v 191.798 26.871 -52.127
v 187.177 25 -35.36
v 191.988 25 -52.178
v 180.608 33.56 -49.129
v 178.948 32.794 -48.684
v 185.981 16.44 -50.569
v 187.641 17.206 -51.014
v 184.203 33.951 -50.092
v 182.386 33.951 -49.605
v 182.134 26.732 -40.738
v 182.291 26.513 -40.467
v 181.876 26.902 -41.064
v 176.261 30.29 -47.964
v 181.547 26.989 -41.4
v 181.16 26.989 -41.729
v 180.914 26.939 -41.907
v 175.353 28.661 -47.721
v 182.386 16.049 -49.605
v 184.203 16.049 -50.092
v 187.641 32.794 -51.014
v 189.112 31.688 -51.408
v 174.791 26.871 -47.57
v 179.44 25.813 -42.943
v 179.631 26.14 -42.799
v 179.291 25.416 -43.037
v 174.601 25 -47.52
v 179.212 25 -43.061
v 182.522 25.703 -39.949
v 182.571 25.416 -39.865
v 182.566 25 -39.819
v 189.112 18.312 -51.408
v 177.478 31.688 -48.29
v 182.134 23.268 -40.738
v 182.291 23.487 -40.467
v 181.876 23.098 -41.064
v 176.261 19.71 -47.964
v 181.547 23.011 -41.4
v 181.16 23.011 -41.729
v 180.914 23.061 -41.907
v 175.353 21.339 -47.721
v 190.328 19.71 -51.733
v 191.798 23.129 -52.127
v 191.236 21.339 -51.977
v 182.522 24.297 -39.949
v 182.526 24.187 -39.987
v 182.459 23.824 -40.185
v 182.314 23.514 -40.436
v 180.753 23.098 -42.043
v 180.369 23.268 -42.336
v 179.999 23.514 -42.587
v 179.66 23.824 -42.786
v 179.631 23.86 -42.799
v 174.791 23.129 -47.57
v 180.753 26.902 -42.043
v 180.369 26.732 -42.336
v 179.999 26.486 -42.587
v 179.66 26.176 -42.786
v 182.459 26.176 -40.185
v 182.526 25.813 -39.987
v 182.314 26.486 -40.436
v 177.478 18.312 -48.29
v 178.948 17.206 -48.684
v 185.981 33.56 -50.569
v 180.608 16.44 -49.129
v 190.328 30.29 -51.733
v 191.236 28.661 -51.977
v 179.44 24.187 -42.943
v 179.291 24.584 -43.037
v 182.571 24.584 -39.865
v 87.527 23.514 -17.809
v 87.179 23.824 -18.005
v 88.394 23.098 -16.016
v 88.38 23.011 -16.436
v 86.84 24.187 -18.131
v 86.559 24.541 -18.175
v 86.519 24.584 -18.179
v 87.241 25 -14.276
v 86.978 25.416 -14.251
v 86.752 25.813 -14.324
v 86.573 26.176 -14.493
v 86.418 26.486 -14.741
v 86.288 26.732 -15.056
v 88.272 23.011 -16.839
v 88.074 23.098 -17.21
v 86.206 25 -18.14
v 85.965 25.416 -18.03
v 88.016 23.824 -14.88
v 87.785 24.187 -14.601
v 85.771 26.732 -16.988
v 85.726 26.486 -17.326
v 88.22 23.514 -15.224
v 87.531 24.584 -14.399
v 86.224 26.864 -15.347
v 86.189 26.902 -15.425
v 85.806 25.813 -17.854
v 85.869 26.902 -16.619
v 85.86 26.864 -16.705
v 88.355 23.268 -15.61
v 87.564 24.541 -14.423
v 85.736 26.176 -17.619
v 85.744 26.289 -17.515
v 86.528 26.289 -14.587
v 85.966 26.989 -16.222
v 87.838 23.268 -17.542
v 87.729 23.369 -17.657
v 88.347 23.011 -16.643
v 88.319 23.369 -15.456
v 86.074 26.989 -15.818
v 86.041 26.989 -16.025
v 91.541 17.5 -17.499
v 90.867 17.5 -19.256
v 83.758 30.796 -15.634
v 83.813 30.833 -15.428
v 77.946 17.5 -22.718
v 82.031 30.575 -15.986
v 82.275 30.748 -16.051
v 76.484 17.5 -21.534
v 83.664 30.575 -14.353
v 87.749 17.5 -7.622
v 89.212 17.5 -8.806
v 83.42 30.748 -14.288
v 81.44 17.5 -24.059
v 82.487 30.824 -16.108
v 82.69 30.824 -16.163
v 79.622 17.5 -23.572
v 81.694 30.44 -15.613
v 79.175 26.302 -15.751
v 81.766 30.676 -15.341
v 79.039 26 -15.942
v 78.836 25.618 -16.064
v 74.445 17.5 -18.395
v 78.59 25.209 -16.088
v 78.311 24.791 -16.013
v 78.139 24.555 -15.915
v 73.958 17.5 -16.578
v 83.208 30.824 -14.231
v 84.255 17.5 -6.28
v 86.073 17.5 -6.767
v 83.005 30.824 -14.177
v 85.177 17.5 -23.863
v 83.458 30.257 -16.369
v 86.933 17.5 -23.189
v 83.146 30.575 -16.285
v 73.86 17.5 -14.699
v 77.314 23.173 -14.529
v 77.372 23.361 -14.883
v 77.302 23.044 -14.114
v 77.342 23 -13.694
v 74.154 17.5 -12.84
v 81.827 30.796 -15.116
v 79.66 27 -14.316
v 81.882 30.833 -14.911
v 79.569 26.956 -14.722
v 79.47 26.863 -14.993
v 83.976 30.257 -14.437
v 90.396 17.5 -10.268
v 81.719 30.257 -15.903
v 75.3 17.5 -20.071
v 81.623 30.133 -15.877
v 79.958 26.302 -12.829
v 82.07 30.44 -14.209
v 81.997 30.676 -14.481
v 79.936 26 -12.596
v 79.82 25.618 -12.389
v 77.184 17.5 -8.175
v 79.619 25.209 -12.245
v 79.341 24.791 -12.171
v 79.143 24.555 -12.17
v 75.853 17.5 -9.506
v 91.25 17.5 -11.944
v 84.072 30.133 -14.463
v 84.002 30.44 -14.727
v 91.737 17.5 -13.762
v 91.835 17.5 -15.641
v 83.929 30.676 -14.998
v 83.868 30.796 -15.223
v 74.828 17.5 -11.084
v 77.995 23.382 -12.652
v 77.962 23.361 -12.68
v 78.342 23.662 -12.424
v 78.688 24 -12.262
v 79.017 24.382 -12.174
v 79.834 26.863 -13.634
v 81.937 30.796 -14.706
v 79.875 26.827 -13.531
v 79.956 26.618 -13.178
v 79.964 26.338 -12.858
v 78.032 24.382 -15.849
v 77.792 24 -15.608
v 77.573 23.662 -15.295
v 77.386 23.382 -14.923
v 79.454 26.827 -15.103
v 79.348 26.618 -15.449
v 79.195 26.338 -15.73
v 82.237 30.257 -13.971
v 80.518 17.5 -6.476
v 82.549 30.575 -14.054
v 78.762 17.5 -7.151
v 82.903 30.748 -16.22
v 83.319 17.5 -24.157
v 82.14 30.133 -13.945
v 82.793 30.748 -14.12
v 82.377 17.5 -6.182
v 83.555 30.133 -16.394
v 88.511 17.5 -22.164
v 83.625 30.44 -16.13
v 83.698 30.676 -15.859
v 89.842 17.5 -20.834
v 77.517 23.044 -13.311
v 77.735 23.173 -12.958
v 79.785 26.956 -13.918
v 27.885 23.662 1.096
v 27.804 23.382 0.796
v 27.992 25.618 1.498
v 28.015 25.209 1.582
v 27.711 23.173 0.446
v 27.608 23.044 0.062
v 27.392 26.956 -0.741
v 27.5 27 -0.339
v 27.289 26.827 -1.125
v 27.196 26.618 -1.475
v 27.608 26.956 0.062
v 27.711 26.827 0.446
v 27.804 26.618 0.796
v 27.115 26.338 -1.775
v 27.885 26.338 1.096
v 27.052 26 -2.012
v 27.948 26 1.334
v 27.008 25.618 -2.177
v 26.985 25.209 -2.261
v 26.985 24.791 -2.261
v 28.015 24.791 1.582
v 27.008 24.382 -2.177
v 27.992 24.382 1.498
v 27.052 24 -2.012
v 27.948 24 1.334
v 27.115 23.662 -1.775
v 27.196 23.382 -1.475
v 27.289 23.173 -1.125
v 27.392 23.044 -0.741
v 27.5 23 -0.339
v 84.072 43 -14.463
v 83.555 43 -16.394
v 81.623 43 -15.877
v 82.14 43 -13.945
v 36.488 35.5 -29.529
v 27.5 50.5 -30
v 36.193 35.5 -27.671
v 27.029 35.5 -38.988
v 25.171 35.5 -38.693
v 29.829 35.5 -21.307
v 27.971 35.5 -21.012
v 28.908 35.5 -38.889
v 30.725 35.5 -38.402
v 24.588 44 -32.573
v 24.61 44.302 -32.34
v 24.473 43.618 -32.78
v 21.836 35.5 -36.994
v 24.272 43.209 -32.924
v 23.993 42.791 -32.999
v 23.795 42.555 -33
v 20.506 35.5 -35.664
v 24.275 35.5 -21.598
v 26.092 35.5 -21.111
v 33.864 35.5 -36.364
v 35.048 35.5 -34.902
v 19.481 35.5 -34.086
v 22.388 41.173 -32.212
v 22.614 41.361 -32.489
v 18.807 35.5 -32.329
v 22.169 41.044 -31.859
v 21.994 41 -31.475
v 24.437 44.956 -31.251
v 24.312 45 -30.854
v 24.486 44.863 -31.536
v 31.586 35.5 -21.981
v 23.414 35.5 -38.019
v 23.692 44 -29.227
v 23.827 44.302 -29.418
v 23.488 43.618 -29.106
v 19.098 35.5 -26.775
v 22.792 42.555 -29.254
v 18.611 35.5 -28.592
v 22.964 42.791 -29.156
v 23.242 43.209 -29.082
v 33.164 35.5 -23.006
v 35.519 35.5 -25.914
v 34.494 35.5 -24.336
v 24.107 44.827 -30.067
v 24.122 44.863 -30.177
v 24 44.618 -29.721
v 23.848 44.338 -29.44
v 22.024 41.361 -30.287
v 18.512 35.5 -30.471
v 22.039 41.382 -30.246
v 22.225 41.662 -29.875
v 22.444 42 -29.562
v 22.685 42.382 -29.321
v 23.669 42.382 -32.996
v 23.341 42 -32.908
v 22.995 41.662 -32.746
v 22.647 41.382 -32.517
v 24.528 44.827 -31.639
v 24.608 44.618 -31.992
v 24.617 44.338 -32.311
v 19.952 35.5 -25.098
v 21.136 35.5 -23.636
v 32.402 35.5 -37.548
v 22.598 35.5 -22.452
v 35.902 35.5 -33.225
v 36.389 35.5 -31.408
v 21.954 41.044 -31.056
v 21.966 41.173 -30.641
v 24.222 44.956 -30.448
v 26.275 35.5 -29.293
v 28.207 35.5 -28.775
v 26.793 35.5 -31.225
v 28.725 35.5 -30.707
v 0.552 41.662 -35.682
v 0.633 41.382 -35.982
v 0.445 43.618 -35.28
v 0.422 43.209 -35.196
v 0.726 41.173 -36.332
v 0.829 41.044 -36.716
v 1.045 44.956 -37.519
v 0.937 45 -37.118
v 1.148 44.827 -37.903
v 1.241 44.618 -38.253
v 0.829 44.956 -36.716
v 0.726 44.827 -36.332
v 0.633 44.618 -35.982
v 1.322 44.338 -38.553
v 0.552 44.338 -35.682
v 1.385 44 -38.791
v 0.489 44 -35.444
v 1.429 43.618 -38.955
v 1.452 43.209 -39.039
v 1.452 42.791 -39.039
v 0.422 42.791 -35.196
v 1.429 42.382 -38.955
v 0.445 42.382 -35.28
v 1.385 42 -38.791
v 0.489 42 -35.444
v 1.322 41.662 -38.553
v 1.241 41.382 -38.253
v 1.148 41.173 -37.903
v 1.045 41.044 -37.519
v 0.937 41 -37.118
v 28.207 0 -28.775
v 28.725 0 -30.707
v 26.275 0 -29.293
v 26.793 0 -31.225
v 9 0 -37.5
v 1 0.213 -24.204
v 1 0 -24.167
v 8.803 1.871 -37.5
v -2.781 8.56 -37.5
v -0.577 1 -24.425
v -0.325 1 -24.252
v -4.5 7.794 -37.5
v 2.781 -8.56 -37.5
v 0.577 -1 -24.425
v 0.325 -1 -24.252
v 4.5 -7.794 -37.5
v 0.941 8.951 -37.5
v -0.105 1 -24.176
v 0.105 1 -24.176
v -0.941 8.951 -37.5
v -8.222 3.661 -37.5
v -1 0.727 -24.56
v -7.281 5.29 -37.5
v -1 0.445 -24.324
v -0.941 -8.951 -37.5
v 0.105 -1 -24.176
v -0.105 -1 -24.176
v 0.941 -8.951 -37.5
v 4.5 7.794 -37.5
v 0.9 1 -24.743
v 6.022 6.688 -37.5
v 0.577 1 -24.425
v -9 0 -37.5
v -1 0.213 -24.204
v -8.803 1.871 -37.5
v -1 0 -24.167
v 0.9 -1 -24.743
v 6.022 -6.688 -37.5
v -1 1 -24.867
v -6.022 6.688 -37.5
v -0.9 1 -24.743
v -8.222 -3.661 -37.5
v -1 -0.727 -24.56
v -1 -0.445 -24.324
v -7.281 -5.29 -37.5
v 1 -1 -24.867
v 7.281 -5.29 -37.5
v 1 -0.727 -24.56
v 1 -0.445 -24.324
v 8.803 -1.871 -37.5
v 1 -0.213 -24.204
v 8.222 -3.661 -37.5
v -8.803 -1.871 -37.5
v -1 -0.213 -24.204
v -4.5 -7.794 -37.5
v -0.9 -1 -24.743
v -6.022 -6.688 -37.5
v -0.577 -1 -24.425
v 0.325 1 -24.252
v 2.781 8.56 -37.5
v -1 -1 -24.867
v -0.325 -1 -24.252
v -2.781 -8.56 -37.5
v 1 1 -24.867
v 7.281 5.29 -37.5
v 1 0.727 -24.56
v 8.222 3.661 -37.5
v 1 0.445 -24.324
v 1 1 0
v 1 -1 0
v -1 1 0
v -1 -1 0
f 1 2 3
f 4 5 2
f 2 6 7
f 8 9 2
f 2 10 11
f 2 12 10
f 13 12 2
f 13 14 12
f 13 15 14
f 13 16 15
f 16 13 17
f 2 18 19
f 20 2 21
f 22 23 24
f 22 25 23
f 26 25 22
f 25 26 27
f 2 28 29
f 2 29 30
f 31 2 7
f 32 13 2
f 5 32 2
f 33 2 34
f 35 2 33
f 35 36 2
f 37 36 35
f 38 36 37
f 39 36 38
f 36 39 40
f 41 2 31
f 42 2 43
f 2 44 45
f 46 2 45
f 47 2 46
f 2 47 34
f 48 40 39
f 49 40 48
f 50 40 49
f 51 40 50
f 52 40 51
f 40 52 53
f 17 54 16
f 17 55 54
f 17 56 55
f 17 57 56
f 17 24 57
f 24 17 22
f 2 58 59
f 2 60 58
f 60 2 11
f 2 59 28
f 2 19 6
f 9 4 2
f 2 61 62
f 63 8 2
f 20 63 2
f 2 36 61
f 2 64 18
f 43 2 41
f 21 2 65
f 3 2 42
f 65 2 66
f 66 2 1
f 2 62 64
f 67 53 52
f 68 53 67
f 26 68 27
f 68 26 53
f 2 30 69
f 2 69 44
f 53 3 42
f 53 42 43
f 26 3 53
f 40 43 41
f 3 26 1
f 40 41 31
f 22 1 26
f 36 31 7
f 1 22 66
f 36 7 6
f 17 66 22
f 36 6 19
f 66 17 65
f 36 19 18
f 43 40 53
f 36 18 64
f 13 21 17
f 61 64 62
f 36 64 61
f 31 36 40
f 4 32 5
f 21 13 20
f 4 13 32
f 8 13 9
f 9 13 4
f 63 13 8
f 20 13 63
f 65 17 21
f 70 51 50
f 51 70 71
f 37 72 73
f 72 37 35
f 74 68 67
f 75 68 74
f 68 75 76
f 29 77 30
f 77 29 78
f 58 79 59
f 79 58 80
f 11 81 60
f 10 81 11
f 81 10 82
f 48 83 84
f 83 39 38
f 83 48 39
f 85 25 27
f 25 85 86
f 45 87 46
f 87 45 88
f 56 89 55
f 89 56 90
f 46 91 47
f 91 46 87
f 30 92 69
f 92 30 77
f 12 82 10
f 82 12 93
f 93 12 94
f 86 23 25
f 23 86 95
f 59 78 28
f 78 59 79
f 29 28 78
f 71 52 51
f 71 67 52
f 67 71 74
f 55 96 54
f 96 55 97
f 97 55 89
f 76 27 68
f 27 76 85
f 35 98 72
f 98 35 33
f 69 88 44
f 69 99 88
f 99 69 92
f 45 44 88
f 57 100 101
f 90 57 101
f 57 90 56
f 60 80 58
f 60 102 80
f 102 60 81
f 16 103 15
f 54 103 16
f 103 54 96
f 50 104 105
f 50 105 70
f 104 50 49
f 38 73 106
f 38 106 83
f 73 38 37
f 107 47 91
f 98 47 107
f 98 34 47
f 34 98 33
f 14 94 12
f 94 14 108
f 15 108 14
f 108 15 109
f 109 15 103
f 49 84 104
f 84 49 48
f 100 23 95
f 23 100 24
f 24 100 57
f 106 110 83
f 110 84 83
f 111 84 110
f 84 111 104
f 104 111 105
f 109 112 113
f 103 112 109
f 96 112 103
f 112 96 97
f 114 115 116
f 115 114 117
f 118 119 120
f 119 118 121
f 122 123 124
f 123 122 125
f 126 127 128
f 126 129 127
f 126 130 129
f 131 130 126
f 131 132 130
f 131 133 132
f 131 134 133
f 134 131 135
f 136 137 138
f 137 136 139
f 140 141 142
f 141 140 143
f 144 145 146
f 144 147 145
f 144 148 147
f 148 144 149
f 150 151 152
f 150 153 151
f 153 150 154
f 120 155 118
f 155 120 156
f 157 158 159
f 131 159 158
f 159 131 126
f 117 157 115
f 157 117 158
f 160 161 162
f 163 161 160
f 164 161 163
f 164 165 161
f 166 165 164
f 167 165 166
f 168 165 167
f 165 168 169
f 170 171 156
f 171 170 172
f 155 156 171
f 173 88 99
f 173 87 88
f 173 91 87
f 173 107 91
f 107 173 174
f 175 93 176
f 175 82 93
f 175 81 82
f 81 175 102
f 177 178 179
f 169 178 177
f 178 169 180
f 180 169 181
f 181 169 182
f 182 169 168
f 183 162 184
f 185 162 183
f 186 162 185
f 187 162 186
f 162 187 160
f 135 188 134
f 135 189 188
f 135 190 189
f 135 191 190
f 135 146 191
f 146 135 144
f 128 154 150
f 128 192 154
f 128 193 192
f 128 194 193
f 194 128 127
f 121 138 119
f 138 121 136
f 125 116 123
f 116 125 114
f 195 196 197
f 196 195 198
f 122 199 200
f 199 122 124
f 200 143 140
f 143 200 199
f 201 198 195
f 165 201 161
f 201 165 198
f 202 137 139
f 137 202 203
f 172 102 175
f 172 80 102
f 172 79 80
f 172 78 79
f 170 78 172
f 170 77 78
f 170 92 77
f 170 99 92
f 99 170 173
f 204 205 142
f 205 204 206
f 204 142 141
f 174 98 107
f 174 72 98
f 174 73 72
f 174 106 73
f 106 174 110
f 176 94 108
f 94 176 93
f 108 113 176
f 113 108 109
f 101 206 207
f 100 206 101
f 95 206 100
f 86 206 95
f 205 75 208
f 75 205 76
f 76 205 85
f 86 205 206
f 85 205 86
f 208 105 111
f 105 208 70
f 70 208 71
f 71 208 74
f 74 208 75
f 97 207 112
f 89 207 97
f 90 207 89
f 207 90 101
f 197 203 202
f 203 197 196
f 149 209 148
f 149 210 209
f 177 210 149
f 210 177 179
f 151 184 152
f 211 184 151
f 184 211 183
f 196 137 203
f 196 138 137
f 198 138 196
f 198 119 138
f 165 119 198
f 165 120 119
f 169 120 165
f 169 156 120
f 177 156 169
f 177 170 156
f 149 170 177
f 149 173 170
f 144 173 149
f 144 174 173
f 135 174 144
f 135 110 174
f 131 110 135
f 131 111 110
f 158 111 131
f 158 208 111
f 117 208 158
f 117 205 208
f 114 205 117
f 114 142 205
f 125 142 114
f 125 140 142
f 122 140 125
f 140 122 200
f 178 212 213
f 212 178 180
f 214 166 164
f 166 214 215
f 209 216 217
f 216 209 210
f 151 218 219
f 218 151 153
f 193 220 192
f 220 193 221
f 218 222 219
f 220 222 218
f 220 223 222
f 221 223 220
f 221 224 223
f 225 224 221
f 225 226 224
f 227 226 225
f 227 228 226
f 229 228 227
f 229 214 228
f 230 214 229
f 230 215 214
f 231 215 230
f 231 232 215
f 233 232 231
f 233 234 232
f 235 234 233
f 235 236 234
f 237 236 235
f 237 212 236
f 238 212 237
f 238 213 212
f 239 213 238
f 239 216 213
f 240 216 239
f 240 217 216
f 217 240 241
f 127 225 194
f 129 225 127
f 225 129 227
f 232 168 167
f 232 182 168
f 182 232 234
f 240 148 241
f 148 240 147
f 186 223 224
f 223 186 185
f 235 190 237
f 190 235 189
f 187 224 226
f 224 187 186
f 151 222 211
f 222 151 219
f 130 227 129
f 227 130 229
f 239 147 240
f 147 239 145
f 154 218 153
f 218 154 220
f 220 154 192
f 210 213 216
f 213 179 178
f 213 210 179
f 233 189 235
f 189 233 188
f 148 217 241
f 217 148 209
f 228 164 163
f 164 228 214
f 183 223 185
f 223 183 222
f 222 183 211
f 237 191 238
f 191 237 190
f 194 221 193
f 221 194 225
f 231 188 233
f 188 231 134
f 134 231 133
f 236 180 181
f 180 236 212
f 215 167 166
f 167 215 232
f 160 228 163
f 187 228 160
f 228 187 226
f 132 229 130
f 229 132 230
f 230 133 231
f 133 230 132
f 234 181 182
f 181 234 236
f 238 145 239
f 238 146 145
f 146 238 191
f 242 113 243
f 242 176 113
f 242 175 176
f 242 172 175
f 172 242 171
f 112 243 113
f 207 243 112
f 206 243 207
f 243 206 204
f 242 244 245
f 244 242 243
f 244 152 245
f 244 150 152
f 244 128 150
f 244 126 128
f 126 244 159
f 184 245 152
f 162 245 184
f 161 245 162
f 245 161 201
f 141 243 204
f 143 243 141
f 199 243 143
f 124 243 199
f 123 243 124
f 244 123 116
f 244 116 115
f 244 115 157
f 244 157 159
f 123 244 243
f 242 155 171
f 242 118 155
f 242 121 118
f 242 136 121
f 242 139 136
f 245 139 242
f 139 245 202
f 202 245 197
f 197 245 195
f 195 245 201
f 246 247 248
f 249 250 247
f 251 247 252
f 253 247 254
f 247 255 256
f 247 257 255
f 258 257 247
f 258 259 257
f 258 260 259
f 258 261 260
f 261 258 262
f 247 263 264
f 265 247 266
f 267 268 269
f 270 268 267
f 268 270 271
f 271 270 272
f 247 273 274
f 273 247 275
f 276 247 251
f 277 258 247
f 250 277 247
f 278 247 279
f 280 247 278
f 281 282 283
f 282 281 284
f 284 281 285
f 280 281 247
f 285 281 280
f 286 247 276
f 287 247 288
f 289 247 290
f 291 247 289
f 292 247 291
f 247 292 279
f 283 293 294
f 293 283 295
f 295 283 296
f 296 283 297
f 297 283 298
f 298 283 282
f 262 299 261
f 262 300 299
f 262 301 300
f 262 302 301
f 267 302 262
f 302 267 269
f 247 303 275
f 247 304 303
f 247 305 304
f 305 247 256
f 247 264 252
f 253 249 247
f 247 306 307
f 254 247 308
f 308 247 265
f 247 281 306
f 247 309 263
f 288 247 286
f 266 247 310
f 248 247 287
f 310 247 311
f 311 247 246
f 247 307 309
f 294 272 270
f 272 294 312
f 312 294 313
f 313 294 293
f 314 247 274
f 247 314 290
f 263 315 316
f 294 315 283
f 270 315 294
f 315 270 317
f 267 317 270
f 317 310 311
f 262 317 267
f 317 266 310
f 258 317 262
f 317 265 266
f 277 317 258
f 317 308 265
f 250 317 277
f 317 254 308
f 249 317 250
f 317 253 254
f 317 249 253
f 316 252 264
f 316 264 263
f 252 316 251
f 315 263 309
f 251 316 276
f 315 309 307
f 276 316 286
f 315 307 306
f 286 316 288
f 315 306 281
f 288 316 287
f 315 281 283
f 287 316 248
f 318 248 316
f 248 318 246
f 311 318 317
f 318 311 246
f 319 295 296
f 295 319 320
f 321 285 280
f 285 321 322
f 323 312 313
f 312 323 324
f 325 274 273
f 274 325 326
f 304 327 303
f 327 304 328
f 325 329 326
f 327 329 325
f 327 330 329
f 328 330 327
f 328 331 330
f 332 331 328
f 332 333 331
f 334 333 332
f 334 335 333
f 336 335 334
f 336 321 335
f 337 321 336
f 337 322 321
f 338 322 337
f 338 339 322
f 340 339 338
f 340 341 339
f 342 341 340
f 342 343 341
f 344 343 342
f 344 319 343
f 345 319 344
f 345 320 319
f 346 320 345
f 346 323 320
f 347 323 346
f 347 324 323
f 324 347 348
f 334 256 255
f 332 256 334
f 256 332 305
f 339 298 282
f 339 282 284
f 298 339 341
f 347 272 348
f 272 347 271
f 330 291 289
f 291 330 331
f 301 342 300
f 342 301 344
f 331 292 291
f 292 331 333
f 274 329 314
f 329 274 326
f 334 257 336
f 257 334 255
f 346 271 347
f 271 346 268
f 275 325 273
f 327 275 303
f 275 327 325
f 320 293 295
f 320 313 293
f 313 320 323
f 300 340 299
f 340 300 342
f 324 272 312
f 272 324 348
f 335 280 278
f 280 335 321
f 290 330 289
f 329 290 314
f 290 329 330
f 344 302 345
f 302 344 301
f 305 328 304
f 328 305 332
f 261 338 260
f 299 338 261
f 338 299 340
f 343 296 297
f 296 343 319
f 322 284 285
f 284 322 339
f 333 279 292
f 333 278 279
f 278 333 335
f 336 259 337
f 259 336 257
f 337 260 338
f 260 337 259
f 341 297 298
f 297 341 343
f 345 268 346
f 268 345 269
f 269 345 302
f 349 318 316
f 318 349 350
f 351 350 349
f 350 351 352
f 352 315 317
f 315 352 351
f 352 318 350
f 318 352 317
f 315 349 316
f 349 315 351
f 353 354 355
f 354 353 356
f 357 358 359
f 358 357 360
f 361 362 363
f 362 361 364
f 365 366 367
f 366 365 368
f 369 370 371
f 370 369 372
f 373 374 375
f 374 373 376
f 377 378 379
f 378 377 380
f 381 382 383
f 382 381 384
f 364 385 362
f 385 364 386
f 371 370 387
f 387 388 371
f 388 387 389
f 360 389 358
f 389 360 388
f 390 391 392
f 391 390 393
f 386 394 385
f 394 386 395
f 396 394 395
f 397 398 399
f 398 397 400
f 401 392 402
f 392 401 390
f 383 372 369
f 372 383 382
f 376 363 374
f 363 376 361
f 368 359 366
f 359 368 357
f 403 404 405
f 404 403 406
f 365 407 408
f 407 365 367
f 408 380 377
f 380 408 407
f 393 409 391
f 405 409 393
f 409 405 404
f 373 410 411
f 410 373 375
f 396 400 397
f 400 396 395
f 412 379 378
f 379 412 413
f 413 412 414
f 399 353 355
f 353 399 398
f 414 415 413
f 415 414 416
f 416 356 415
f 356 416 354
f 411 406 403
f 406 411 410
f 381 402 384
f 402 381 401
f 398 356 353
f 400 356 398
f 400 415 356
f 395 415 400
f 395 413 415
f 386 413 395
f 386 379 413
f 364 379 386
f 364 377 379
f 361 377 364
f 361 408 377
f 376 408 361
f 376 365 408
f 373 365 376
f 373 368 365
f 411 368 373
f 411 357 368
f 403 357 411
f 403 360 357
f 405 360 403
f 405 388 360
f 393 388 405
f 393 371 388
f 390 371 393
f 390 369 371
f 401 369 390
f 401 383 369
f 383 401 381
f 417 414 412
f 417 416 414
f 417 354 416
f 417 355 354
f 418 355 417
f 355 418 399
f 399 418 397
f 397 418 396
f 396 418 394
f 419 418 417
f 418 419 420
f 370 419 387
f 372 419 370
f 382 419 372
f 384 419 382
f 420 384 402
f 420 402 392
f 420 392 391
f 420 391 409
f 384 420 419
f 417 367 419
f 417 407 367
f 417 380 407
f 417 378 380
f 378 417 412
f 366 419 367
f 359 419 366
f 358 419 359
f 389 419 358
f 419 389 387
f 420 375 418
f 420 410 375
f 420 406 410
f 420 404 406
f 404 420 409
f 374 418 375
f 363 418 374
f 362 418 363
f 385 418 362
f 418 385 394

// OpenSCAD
resolution = 30;

jr = 9;
jh = 15;
ow = 2;

alpha1 = 0;
a1     = 0;
theta1 = 0;
d1     = -30;

alpha2 = -90;
a2     = 27.5;
theta2 = -15;
d2     = 43;

alpha3 = 0;
a3     = 57.3;
theta3 = 30;
d3     = -18;

alpha4 = 90;
a4     = 106;
theta4 = 0;
d4     = 0;


dh_cone(alpha1, a1, theta1, d1);

module dh_cone(alpha=0, a=0, theta=0, d=0) {
    rotate([alpha, 0, 0])
    translate([a, 0, 0])
    rotate([0, 0, theta])
    translate([0, 0, d]) {
        color([231/255, 88/255, 88/255]) cylinder(r1=jr, r2=0, h=jh, center=true, $fn=resolution); // joint
        rotate ([0, -90, 0]) cylinder (r = 2, h = a, $fn = resolution); // link
        color ([70/255, 70/255, 70/255]) translate([0, 0, -d/2]) cube ([ow, ow, abs(d)], center=true); // offset

        dh_cone2(alpha2, a2, theta2, d2);
    }
}
module dh_cone2(alpha=0, a=0, theta=0, d=0) {
    rotate([alpha, 0, 0])
    translate([a, 0, 0])
    rotate([0, 0, theta])
    translate([0, 0, d]) {
        color([231/255, 88/255, 88/255]) cylinder(r1=jr, r2=0, h=jh, center=true, $fn=resolution); // joint
        rotate ([0, -90, 0]) cylinder (r = 2, h = a, $fn = resolution); // link
        color ([70/255, 70/255, 70/255]) translate([0, 0, -d/2]) cube ([ow, ow, abs(d)], center=true); // offset

        dh_cone3(alpha3, a3, theta3, d3);
    }
}
module dh_cone3(alpha=0, a=0, theta=0, d=0) {
    rotate([alpha, 0, 0])
    translate([a, 0, 0])
    rotate([0, 0, theta])
    translate([0, 0, d]) {
        color([231/255, 88/255, 88/255]) cylinder(r1=jr, r2=0, h=jh, center=true, $fn=resolution); // joint
        rotate ([0, -90, 0]) cylinder (r = 2, h = a, $fn = resolution); // link
        color ([70/255, 70/255, 70/255]) translate([0, 0, -d/2]) cube ([ow, ow, abs(d)], center=true); // offset

        dh_cone4(alpha4, a4, theta4, d4);
    }
}
module dh_cone4(alpha=0, a=0, theta=0, d=0) {
    rotate([alpha, 0, 0])
    translate([a, 0, 0])
    rotate([0, 0, theta])
    translate([0, 0, d]) {
        color([231/255, 88/255, 88/255]) cylinder(r1=jr, r2=0, h=jh, center=true, $fn=resolution); // joint
        rotate ([0, -90, 0]) cylinder (r = 2, h = a, $fn = resolution); // link
        color ([70/255, 70/255, 70/255]) translate([0, 0, -d/2]) cube ([ow, ow, abs(d)], center=true); // offset
    }
}
